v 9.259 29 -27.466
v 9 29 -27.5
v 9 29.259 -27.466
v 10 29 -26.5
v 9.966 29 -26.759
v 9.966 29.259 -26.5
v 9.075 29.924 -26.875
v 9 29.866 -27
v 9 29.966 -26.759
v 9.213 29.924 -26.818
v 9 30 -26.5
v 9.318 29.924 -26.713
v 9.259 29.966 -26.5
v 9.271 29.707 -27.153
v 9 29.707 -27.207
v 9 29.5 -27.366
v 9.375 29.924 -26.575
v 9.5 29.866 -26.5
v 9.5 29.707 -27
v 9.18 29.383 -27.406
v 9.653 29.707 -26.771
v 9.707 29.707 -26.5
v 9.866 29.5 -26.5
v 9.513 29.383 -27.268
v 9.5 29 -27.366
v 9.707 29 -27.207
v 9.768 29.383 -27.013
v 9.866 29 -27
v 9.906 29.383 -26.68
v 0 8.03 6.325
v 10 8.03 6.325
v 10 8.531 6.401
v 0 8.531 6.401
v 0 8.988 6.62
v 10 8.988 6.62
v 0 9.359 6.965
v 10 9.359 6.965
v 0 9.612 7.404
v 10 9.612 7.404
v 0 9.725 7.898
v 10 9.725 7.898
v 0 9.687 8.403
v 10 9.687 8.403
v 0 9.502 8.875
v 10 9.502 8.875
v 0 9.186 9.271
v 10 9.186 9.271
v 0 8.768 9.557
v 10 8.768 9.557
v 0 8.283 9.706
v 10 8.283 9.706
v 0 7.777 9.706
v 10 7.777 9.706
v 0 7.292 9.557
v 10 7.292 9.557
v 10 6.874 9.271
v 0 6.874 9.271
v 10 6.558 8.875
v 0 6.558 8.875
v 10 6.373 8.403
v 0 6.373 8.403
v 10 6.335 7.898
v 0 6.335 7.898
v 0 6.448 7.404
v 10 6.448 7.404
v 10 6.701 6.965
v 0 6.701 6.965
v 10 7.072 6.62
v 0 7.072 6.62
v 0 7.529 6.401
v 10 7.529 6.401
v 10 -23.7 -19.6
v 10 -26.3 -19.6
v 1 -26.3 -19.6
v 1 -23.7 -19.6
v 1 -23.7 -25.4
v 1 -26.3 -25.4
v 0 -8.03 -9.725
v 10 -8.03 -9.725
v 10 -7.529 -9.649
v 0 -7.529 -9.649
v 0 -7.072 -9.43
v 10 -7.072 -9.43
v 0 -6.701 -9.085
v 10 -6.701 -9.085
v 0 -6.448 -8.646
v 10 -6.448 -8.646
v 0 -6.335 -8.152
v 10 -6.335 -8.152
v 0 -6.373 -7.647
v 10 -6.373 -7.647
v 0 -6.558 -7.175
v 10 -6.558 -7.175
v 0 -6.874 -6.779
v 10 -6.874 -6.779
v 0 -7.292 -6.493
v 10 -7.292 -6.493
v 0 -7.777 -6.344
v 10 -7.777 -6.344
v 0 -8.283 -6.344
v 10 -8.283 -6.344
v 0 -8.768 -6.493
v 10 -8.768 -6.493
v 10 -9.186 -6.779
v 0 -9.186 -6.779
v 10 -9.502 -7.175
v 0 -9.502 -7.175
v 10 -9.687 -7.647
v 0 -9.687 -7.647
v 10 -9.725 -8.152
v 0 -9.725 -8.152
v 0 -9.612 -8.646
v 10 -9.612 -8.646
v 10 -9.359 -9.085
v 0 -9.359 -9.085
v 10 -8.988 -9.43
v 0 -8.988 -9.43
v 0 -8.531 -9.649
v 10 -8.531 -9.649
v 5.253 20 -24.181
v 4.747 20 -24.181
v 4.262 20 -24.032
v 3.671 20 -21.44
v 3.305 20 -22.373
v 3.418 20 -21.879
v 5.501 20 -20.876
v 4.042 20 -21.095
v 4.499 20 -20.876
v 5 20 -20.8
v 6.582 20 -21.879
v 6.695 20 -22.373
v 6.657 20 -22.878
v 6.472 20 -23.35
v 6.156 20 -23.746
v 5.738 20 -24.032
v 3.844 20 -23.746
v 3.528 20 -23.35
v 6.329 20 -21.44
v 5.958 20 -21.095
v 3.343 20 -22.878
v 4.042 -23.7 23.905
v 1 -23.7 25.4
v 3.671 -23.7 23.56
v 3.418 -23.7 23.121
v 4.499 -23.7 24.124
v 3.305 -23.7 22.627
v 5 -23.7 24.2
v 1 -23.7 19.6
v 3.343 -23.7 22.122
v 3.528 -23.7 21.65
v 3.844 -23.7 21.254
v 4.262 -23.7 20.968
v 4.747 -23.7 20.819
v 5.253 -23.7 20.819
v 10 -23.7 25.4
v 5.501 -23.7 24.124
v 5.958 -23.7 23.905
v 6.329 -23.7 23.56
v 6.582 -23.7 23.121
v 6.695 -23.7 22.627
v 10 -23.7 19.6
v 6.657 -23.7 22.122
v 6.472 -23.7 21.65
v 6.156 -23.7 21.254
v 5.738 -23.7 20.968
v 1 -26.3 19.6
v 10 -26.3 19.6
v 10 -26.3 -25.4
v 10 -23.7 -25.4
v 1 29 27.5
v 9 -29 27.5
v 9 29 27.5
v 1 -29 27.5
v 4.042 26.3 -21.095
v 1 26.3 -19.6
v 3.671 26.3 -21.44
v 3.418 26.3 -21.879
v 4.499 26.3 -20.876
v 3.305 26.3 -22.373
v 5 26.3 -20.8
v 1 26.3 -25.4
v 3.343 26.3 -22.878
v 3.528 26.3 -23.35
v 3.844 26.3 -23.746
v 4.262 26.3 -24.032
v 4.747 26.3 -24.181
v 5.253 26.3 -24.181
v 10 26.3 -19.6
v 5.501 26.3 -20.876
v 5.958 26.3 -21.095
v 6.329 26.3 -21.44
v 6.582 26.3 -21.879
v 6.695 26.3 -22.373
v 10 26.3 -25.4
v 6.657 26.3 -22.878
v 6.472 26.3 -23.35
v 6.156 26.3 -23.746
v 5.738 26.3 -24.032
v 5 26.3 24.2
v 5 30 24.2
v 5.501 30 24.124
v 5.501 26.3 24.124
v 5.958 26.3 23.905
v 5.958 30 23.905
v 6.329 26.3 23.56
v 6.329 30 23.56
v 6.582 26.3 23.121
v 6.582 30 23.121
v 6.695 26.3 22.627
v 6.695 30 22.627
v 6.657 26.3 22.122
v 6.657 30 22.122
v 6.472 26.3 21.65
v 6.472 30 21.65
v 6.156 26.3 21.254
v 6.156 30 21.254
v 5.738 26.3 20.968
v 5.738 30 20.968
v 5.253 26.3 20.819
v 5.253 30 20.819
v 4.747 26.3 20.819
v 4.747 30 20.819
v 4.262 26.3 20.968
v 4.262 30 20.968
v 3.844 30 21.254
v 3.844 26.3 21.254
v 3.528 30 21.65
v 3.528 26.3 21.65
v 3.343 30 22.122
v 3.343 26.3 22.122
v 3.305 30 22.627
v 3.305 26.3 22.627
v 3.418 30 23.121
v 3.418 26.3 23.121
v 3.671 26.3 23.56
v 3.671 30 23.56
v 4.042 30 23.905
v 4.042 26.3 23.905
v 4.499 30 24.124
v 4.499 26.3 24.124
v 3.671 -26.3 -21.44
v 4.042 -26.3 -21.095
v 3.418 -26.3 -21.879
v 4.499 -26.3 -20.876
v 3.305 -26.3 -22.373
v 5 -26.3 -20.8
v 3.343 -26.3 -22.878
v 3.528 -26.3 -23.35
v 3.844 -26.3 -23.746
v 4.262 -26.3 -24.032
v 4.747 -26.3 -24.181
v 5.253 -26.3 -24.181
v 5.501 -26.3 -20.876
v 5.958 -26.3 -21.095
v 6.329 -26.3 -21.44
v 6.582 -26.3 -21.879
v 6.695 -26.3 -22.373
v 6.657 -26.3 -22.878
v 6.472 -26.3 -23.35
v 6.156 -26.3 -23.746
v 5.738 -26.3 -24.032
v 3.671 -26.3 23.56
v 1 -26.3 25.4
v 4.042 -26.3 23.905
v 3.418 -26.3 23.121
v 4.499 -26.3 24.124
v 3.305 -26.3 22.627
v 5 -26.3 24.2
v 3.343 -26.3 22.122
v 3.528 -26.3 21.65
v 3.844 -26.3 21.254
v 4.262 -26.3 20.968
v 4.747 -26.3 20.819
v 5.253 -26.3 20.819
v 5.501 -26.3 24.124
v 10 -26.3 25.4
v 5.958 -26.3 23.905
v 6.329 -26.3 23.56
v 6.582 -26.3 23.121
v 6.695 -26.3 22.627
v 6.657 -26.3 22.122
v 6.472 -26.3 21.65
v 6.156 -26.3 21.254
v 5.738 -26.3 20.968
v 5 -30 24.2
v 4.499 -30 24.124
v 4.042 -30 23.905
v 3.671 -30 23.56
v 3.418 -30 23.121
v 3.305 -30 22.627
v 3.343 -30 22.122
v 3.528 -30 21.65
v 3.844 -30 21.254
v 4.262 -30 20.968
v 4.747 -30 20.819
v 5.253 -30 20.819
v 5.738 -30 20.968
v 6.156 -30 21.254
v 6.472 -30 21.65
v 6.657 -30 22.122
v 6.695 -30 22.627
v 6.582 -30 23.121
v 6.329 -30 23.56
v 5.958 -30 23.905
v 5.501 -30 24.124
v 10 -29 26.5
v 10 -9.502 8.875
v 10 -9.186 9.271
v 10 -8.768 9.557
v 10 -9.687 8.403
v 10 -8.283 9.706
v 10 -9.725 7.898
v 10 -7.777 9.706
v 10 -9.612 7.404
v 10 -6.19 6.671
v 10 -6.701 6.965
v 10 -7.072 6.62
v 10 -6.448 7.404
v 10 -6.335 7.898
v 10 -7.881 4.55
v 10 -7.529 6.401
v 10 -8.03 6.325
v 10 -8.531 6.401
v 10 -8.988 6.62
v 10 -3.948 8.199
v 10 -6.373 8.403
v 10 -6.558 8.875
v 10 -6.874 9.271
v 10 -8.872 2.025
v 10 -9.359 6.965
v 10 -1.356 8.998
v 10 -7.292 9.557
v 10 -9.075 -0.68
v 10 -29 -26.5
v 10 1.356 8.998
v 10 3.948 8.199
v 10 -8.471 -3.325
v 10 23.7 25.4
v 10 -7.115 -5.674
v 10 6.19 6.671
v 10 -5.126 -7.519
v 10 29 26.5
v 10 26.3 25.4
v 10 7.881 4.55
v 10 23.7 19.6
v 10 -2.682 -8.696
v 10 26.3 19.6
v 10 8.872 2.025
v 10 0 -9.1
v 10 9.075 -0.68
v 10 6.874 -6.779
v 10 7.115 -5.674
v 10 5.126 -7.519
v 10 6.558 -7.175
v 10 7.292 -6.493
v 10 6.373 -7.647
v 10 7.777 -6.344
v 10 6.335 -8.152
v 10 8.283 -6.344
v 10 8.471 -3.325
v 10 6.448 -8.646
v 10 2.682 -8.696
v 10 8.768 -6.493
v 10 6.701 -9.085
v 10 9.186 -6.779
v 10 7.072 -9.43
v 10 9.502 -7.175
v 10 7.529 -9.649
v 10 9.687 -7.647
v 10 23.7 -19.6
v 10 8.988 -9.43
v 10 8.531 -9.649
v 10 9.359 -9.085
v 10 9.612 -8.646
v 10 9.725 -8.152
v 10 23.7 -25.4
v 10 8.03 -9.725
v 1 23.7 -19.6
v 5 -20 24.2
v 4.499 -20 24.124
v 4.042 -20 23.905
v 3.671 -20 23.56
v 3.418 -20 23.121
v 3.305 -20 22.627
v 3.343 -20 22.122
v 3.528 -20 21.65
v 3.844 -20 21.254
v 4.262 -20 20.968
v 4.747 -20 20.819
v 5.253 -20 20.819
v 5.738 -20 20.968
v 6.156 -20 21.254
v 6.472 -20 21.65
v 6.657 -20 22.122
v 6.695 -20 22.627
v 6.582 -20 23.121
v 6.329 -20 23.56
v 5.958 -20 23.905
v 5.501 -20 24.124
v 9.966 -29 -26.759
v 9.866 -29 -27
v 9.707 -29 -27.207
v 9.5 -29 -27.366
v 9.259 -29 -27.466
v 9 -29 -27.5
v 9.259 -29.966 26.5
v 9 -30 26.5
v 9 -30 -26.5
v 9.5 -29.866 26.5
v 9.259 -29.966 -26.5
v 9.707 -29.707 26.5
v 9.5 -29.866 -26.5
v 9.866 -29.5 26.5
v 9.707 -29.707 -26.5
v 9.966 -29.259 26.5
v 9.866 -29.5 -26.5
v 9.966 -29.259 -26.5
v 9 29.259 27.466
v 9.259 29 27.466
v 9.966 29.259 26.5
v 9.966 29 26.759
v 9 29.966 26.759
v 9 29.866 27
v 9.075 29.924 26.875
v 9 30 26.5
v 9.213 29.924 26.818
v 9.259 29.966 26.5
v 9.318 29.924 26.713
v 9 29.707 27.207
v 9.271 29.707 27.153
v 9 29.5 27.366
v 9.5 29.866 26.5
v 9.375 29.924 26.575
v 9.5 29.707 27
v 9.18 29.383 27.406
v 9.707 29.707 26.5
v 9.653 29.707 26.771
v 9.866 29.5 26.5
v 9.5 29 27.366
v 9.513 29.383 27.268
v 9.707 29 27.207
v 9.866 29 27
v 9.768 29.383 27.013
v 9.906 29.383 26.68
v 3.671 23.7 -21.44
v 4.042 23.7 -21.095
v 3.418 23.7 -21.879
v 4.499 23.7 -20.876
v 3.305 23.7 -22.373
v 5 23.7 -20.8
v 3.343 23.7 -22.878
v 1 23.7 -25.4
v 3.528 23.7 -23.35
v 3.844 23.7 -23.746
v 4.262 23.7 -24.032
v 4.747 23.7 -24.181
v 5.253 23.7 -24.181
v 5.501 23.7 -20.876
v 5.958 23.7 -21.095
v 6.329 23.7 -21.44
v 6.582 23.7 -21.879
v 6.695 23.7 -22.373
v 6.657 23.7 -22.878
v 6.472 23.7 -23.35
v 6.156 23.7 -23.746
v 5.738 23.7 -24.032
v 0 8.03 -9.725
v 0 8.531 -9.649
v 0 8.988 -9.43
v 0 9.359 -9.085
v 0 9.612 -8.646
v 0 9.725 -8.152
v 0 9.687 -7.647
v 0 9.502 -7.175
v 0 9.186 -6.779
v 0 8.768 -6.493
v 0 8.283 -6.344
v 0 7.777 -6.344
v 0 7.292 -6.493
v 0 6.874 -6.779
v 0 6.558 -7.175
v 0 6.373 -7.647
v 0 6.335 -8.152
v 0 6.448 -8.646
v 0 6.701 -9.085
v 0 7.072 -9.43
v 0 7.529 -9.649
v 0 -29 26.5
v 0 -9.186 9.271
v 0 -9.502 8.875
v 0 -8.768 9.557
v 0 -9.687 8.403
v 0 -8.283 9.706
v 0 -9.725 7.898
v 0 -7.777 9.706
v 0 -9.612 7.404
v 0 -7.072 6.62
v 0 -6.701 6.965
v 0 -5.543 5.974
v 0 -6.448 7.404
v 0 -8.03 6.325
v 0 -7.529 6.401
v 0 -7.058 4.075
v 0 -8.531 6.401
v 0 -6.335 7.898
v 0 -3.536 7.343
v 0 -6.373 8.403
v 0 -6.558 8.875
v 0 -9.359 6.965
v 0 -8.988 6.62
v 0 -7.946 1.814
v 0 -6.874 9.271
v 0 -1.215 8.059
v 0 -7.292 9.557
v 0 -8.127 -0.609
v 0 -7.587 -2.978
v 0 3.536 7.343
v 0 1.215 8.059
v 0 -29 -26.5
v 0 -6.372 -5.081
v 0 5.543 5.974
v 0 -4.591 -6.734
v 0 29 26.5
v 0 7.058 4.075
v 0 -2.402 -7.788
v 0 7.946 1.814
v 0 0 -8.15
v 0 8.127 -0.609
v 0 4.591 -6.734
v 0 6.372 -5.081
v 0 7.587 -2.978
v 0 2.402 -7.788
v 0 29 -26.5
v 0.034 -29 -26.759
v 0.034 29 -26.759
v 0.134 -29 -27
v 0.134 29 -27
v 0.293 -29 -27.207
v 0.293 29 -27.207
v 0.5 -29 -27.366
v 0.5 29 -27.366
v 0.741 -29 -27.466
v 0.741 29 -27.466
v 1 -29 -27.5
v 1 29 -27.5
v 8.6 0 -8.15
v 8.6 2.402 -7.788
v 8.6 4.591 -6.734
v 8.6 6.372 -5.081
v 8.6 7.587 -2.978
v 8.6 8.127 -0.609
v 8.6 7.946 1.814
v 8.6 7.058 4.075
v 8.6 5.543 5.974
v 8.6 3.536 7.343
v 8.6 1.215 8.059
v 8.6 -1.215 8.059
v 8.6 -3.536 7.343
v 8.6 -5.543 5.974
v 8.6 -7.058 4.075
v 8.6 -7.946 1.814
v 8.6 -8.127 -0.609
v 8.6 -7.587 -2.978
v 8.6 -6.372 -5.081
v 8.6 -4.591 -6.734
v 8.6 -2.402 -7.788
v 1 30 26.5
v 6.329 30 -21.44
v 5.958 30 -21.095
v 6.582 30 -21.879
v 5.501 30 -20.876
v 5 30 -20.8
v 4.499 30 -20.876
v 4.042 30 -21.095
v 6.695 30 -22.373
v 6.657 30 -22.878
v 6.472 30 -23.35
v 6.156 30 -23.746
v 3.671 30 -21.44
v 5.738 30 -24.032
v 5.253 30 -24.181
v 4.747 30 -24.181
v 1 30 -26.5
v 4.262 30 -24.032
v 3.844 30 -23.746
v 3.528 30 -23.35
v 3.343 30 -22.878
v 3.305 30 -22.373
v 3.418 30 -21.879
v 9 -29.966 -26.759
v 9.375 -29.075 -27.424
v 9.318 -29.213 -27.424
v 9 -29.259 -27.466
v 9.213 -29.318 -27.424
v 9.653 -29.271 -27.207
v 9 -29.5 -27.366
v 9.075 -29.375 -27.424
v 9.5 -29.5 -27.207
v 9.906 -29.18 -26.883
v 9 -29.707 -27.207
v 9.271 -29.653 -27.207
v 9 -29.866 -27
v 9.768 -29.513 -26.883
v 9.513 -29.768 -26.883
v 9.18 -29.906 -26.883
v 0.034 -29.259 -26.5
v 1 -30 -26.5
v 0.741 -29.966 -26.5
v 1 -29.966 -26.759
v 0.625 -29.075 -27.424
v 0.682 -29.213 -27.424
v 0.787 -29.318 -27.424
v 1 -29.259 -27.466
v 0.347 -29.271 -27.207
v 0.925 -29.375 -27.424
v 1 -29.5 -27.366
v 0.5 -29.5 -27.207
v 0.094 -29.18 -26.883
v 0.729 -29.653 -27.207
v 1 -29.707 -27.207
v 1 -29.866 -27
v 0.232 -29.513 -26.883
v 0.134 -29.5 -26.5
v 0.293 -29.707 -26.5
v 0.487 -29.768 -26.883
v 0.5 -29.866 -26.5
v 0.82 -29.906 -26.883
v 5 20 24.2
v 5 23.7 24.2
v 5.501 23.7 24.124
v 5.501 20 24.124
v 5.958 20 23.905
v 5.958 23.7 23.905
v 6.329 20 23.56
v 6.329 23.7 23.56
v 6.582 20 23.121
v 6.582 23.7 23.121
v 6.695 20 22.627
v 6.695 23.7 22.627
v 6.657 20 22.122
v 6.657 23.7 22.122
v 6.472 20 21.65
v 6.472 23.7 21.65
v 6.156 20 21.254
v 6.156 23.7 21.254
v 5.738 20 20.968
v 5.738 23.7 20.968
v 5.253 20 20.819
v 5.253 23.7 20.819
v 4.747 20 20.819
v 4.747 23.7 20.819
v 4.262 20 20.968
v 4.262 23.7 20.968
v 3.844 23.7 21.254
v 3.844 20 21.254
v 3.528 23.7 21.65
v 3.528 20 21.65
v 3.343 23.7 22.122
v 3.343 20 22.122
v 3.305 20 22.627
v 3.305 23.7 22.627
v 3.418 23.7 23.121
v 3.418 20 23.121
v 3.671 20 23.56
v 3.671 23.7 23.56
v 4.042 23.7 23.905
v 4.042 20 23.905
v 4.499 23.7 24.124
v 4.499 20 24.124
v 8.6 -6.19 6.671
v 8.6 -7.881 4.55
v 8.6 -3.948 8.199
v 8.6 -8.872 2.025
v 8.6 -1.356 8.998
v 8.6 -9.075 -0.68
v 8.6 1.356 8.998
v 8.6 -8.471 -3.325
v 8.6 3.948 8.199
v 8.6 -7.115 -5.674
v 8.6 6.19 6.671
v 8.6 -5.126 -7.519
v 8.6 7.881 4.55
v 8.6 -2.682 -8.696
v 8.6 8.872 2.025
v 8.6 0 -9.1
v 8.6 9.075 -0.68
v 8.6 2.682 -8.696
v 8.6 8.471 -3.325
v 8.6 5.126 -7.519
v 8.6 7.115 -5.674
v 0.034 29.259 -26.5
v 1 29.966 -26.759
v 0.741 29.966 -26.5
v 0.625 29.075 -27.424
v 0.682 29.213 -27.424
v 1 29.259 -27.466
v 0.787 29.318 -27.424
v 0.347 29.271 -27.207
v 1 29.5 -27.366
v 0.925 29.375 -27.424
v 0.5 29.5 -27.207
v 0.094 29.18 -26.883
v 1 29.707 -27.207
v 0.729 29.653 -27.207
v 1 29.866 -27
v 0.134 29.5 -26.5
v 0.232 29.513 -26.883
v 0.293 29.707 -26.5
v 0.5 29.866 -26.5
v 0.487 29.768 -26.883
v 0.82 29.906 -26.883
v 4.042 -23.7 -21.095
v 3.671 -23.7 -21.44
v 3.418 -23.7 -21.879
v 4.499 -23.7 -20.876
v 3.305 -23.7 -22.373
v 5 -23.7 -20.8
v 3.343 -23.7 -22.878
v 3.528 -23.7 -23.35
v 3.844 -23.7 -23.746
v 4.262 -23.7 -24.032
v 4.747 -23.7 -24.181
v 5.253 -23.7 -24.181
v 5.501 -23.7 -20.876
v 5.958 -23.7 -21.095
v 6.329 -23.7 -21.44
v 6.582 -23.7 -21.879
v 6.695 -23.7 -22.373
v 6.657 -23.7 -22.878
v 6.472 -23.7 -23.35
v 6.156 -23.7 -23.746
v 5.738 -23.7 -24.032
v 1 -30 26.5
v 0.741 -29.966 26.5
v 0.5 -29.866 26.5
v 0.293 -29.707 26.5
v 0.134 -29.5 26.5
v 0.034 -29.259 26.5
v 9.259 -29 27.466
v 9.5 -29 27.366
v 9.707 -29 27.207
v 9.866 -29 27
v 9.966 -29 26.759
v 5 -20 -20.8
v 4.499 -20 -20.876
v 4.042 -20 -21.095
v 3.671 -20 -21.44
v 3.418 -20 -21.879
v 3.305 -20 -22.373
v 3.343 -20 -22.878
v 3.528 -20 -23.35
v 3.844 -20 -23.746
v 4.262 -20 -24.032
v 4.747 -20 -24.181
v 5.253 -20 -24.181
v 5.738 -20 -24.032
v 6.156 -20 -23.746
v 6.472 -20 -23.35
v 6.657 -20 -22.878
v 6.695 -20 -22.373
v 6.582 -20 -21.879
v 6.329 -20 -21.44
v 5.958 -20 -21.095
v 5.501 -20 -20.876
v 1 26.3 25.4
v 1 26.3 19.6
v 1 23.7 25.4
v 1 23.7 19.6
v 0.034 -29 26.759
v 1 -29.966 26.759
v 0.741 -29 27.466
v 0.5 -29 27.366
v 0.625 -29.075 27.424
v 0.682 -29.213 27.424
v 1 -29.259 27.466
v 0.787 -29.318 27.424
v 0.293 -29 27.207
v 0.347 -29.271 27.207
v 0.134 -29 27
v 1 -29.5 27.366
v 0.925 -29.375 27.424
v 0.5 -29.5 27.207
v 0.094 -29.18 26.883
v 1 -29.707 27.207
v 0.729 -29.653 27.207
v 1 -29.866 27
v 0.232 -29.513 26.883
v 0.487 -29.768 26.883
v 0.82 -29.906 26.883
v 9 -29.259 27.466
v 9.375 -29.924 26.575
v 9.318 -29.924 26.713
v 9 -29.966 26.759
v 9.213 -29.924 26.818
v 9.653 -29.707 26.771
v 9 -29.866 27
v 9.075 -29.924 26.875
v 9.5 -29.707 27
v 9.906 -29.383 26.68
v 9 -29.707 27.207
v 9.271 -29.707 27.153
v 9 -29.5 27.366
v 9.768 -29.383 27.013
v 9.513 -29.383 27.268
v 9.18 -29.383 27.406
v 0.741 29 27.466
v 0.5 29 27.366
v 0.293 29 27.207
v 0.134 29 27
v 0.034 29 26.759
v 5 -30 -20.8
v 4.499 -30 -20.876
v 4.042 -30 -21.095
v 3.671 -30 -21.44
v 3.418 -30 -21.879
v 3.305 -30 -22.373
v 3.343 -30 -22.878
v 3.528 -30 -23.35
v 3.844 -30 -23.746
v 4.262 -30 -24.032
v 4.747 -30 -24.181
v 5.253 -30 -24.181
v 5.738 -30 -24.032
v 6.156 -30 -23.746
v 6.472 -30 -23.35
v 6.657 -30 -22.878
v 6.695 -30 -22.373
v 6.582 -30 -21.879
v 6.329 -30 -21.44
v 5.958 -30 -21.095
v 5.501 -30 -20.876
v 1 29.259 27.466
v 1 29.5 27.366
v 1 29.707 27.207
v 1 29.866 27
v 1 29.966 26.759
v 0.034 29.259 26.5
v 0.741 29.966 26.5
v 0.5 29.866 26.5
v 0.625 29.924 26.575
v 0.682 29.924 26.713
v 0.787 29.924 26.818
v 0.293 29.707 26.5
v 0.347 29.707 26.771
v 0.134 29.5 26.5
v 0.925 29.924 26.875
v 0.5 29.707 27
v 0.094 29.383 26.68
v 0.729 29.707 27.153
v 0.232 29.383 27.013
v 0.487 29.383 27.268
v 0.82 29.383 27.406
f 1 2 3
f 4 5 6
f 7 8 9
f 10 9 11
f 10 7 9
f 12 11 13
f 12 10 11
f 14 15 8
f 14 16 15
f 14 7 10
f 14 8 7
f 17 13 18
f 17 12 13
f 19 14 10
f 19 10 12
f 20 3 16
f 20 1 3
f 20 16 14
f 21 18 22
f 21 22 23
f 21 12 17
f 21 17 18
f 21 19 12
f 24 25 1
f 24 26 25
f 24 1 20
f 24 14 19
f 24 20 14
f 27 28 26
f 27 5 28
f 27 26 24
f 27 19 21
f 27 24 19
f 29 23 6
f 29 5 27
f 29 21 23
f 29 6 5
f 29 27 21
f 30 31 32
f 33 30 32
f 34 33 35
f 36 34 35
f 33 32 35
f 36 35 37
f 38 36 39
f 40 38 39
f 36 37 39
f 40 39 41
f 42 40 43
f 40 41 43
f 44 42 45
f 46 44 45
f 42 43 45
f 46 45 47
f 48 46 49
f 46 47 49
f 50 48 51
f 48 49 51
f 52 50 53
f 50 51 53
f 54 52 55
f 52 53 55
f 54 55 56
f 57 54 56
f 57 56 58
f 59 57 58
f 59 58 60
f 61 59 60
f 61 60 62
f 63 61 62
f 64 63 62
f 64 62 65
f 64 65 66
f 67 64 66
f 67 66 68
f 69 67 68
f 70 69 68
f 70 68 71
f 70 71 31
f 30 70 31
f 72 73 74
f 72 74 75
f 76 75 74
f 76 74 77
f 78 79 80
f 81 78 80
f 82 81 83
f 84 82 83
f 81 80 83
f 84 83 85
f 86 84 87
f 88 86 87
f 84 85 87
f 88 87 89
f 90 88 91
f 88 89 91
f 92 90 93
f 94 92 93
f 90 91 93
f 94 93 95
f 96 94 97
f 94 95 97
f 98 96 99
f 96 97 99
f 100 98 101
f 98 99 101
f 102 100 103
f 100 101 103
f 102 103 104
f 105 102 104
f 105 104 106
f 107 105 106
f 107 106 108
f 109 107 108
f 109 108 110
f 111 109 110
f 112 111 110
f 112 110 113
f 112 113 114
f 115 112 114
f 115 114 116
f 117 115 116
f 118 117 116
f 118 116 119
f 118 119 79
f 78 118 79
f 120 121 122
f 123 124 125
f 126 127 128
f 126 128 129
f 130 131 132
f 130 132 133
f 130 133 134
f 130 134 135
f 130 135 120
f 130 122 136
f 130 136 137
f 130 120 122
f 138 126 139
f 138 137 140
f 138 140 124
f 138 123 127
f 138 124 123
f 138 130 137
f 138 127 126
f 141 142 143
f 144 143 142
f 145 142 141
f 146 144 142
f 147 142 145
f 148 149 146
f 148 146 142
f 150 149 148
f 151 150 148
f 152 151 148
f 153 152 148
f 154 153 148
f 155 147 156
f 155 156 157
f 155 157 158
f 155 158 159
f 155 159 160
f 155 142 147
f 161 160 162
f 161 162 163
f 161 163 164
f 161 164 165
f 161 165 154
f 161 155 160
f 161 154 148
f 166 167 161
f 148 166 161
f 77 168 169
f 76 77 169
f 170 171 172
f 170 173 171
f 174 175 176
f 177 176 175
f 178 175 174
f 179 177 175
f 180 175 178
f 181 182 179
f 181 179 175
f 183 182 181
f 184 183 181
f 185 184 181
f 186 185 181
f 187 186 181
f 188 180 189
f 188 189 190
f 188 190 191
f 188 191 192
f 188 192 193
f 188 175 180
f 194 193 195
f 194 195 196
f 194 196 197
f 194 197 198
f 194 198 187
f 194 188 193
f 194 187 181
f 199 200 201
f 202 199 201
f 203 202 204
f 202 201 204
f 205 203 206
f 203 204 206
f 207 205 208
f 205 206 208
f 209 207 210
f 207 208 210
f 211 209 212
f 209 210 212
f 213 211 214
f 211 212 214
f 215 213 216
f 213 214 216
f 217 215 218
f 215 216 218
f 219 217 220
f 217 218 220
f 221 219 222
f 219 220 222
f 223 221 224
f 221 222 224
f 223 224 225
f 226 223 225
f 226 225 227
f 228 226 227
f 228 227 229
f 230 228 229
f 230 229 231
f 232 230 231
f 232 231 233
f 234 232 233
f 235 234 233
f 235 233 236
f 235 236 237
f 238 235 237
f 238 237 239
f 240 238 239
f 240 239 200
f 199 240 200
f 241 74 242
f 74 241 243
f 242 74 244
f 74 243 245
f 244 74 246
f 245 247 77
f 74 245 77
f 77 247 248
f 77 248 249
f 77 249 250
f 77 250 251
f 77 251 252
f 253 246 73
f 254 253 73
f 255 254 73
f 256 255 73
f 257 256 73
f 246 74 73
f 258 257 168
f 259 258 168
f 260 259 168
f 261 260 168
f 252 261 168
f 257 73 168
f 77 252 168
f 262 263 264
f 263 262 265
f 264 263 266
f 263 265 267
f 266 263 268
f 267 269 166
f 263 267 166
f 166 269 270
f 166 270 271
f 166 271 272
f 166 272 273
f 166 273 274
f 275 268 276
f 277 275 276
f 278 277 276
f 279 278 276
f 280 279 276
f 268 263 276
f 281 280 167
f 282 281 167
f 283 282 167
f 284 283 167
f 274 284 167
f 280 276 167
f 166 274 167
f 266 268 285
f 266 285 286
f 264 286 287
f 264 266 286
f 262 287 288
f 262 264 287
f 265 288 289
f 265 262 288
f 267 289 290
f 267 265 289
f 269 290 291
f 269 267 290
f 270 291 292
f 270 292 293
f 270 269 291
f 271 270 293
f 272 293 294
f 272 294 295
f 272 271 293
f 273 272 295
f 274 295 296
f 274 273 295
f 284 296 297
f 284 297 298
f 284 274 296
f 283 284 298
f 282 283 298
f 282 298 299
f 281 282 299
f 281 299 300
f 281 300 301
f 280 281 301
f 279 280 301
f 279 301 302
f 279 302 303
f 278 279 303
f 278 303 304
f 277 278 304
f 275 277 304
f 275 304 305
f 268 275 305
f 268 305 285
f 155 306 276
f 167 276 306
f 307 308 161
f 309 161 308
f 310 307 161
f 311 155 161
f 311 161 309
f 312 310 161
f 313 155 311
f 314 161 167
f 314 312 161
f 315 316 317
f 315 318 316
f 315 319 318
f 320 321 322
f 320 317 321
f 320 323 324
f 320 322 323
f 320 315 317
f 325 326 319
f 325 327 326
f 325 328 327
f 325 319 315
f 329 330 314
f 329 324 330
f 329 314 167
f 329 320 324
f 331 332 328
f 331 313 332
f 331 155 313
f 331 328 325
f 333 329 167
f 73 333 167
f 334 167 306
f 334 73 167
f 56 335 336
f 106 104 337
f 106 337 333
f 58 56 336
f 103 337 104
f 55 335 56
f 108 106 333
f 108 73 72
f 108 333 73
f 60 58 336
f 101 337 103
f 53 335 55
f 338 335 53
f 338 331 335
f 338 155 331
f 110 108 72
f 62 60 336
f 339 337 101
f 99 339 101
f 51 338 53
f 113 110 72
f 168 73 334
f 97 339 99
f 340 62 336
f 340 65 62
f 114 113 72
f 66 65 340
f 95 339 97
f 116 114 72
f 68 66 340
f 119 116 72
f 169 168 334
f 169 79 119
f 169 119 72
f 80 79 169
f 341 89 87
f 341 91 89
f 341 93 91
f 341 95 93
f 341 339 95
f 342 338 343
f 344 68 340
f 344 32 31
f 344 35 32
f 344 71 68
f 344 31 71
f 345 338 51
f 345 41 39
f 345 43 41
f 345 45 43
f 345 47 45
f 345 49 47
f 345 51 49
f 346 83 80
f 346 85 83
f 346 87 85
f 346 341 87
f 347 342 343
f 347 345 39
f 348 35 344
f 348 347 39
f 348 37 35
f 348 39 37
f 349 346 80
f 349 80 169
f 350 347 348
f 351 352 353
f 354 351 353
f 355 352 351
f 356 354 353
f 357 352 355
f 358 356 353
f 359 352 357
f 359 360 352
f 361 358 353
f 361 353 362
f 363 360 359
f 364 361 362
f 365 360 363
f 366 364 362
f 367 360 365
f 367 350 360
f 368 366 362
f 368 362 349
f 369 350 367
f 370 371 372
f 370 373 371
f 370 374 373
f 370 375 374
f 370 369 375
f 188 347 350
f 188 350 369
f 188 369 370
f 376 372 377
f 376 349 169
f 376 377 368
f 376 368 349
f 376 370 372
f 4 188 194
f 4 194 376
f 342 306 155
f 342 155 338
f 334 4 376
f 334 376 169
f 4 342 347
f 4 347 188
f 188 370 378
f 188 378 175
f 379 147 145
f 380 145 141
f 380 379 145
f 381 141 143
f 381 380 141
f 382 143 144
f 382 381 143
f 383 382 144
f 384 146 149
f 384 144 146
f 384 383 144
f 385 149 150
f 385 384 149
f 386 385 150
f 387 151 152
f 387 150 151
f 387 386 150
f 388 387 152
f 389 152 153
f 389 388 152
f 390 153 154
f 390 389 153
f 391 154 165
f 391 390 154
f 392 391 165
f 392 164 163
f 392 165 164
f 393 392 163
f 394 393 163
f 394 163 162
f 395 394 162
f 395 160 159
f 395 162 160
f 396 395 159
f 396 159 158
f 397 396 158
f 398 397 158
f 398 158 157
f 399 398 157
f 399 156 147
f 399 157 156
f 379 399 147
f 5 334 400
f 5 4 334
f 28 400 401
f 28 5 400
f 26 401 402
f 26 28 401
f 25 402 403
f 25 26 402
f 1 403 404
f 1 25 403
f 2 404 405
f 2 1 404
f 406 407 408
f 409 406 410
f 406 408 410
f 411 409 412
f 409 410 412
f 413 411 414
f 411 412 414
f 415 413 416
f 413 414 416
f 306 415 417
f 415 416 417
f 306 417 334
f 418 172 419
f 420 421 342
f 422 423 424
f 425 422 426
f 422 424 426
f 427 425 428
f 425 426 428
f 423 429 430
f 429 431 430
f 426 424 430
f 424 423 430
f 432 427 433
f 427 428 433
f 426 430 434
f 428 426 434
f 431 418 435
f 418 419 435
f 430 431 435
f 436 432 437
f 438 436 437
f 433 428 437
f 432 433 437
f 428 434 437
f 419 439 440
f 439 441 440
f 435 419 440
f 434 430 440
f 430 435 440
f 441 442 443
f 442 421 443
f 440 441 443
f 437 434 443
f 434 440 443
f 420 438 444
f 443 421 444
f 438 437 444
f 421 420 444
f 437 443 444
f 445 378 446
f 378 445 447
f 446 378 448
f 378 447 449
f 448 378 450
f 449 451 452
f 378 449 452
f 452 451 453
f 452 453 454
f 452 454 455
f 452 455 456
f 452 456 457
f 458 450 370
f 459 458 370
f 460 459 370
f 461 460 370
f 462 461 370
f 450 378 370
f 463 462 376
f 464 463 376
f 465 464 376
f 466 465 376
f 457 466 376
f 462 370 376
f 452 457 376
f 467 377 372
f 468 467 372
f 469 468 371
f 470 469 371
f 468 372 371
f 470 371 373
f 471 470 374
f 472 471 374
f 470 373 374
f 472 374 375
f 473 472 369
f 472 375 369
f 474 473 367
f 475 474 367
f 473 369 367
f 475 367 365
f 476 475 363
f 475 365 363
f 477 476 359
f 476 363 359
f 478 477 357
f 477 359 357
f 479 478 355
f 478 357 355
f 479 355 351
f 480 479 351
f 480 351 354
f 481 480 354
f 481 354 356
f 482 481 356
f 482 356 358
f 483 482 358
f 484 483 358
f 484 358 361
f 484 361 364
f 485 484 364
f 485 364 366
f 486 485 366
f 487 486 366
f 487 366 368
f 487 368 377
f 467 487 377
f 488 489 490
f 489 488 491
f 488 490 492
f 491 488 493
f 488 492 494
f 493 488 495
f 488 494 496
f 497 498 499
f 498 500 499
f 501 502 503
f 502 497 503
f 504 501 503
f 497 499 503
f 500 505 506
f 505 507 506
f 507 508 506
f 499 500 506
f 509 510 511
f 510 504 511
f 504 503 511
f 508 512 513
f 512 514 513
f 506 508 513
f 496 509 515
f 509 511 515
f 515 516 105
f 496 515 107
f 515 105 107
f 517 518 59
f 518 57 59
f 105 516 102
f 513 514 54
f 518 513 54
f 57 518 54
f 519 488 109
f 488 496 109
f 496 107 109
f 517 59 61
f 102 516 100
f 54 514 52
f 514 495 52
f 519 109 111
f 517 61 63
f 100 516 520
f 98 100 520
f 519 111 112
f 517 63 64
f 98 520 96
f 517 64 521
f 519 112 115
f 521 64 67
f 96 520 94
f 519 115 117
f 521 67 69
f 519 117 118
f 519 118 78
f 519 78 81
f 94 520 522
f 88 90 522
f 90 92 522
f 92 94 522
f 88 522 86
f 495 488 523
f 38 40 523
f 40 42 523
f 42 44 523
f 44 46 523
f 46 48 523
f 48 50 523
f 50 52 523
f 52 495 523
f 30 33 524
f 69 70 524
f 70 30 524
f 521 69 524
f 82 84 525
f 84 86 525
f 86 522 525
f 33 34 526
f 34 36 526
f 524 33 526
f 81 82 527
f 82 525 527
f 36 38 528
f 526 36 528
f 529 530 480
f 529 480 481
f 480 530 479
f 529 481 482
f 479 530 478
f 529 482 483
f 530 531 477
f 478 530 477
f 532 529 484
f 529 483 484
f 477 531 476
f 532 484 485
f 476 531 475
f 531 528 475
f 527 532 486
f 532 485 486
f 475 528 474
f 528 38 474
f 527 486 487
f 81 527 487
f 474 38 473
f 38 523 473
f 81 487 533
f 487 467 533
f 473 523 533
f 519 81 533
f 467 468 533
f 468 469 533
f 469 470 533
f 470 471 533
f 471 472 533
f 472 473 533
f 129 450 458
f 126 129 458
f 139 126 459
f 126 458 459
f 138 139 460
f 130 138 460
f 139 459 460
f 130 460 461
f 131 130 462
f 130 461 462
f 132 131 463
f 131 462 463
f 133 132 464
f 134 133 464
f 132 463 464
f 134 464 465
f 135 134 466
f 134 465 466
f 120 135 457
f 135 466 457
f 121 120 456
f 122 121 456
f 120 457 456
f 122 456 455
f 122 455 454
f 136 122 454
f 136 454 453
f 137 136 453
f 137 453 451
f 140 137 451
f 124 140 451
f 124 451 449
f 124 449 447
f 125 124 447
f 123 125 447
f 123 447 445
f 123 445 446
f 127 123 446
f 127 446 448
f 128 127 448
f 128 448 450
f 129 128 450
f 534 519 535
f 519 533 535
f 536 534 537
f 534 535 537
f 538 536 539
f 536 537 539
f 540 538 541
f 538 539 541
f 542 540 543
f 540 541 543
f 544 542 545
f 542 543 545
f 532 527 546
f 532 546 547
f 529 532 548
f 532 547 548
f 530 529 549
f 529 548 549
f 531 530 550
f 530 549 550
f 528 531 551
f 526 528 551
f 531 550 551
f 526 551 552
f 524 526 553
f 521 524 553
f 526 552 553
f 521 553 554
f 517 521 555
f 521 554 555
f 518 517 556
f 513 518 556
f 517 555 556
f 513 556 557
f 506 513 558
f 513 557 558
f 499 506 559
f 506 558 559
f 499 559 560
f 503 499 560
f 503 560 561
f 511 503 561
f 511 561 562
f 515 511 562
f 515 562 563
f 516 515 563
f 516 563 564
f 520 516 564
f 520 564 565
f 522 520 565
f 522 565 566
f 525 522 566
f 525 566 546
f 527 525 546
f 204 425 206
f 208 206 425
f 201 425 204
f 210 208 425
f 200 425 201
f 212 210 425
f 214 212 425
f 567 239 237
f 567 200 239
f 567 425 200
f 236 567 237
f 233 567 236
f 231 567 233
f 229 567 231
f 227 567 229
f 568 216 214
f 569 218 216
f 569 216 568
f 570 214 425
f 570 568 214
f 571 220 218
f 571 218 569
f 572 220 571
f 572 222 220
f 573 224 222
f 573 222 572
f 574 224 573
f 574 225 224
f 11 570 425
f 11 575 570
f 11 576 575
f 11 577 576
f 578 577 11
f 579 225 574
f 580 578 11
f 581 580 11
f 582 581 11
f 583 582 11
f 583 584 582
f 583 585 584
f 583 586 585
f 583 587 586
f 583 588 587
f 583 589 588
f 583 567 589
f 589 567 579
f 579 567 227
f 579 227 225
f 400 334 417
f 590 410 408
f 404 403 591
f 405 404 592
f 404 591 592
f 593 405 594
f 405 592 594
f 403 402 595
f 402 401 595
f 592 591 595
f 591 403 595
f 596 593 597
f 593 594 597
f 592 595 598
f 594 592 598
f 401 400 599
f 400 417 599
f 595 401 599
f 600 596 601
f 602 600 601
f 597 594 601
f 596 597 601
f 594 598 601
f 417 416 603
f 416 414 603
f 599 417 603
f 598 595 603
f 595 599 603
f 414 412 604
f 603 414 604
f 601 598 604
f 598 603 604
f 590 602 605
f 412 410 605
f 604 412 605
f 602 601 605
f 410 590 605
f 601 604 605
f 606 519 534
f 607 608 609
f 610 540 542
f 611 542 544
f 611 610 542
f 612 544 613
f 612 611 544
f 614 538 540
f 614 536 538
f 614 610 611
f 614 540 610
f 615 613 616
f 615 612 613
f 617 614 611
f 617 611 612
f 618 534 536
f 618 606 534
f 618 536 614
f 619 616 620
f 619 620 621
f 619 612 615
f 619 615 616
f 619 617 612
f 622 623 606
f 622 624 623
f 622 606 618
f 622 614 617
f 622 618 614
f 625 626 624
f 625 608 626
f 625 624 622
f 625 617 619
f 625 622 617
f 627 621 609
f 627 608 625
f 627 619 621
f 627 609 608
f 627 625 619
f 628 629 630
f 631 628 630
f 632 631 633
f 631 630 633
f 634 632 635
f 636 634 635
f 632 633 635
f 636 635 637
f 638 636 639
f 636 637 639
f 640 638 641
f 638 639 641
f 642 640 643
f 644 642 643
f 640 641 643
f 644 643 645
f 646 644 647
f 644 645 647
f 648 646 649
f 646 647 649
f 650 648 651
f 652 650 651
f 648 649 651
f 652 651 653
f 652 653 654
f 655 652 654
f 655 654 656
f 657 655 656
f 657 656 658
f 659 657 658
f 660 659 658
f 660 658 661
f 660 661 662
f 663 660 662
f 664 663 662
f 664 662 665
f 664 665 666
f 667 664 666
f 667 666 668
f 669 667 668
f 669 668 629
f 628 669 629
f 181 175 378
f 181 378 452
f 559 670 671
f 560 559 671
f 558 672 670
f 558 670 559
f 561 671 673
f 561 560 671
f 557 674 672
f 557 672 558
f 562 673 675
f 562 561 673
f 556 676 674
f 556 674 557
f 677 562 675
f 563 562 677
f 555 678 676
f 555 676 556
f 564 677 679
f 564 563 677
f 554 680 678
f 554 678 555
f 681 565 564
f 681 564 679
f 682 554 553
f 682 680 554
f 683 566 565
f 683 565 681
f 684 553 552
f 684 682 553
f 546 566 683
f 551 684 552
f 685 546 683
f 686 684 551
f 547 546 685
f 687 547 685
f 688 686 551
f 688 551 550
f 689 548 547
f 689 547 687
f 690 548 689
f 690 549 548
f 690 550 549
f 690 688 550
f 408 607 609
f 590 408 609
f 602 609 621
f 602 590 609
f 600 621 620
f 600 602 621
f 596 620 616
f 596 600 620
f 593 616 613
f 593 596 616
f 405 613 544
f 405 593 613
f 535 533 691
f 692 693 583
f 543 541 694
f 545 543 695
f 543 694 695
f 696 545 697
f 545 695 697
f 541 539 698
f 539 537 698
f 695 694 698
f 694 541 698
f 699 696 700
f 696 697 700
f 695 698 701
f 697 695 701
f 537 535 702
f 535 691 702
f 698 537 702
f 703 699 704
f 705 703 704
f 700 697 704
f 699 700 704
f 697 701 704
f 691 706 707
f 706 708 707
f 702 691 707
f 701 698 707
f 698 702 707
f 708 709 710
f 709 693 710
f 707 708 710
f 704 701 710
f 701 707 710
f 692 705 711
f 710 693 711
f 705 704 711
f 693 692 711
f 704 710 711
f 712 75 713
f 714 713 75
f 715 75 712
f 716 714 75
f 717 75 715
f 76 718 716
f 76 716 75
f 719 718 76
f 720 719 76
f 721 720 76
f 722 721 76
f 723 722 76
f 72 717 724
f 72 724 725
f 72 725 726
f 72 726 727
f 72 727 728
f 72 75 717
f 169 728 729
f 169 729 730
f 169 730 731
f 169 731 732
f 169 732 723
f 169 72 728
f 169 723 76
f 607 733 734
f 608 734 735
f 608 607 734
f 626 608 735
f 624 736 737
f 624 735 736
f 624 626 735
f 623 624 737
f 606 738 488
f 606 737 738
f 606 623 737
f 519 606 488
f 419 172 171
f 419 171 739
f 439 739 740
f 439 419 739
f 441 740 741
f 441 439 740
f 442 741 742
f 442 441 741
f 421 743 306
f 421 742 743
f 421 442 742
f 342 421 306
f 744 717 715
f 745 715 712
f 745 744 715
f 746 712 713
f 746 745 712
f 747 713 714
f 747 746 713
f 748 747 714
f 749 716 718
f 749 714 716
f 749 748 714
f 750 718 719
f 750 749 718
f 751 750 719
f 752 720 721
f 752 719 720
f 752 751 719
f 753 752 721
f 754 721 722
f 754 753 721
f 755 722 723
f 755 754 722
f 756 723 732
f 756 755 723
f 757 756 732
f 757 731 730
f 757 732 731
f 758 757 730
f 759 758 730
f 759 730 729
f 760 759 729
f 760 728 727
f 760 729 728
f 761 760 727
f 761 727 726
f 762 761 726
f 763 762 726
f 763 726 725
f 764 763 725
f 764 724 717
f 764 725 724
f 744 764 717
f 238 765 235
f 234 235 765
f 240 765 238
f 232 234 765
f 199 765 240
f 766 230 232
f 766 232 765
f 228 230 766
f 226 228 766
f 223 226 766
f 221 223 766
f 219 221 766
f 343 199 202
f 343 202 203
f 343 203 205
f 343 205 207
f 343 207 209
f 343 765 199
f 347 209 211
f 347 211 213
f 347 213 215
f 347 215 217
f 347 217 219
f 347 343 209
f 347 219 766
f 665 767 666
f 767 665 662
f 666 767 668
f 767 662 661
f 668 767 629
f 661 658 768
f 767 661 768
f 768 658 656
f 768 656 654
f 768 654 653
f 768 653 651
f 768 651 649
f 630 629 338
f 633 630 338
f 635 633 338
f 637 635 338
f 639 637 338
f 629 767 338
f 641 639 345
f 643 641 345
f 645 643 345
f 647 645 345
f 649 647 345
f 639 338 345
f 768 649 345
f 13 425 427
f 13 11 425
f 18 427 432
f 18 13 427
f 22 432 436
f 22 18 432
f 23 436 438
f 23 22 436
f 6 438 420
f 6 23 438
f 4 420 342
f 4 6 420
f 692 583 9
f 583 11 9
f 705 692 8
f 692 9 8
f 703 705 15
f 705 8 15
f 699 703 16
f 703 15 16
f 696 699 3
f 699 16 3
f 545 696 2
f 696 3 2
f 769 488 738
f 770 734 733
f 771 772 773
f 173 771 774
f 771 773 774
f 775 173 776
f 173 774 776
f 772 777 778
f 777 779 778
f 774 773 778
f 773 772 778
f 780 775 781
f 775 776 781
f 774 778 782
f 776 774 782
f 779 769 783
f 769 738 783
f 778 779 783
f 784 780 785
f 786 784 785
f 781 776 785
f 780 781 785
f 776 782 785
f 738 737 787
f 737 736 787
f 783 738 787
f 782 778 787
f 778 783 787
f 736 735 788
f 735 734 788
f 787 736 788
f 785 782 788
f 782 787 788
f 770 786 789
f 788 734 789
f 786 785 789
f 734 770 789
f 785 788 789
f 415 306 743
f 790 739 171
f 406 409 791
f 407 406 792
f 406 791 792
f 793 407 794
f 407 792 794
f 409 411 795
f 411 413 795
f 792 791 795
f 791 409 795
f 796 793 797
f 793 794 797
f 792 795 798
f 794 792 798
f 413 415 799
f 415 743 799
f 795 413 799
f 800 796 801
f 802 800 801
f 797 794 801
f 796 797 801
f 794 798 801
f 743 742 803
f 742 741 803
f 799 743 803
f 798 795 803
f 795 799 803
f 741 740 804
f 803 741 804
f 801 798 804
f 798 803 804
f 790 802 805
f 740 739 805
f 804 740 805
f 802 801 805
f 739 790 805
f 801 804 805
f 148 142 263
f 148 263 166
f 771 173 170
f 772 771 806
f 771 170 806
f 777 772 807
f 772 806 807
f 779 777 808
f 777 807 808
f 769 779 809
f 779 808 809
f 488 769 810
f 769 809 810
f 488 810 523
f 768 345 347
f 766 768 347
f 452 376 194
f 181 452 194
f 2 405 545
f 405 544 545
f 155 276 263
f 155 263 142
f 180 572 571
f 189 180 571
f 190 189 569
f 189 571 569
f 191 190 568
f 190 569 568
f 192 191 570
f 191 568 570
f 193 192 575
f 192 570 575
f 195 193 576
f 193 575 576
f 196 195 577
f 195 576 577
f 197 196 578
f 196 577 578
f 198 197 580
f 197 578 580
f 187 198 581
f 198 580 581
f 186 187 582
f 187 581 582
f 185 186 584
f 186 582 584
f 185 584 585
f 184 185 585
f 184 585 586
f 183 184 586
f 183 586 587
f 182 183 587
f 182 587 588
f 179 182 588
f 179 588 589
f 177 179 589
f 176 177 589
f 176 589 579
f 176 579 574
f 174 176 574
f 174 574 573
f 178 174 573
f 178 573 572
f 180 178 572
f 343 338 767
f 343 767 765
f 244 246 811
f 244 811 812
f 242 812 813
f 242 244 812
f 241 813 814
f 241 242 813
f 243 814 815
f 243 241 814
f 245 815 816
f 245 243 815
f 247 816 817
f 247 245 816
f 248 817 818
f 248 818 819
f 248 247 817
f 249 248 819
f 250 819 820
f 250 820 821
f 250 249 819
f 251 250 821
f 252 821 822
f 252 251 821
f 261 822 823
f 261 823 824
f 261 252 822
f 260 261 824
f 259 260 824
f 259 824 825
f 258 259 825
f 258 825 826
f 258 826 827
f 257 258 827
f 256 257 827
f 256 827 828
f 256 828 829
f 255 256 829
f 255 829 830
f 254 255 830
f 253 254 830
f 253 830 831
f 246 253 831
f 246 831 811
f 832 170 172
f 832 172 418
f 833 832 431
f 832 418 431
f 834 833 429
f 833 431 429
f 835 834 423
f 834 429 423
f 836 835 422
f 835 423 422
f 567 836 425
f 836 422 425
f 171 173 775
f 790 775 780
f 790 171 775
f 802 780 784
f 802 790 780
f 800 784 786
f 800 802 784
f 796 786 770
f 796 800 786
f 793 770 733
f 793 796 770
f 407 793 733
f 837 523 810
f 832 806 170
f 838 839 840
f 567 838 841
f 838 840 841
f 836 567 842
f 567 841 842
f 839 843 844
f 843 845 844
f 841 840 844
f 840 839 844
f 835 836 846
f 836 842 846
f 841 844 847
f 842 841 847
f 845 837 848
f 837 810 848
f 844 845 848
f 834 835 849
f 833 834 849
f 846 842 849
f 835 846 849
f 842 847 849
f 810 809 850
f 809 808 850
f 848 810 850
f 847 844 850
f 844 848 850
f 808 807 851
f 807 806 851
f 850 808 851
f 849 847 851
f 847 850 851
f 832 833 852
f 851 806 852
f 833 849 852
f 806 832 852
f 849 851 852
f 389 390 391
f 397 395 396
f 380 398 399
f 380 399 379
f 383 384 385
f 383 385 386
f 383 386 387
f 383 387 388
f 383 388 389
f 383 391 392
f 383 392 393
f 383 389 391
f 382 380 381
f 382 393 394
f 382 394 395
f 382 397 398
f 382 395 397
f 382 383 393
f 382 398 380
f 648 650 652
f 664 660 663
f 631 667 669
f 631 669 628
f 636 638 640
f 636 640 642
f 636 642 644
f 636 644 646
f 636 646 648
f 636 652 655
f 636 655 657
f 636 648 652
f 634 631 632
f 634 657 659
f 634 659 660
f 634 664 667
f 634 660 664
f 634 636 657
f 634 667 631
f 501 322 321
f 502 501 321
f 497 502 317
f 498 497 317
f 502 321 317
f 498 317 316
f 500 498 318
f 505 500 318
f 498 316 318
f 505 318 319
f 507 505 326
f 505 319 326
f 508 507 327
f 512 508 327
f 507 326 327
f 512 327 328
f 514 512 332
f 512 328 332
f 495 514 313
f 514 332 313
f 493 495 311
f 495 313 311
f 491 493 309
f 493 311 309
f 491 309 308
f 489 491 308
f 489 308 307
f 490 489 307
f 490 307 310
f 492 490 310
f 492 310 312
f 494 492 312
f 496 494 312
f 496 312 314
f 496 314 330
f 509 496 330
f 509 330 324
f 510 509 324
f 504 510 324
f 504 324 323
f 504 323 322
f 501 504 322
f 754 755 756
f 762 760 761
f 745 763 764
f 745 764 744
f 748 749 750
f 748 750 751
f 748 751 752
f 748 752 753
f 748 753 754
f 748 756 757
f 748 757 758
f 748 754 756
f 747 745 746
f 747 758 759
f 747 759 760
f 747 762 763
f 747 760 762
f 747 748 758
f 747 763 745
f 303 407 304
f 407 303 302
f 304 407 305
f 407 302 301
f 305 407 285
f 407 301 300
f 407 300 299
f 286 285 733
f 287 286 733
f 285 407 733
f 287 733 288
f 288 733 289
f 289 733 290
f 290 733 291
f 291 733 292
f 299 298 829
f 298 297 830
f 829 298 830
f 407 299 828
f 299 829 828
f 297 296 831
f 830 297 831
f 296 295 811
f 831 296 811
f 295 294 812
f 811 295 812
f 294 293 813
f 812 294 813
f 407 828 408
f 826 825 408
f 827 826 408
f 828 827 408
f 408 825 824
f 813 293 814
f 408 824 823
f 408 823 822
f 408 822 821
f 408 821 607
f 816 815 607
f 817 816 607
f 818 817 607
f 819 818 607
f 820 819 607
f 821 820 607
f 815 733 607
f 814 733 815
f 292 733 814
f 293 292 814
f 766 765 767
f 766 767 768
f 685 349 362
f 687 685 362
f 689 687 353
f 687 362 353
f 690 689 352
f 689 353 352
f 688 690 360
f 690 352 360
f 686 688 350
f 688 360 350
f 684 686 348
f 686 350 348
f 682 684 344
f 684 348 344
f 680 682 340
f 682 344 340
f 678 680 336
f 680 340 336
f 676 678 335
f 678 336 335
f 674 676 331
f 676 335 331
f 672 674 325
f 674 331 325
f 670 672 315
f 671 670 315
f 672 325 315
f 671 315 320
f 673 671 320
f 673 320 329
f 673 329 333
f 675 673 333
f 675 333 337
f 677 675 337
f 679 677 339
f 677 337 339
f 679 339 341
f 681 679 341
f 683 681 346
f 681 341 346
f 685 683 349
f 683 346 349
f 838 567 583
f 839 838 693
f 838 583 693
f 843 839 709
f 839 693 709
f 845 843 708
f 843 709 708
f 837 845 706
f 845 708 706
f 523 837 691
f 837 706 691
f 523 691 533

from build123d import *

# Parameters (mm, degrees)
SKETCH1_W           = 55
SKETCH1_H           = 60
BOSS_EXTRUDE1_DEPTH = 10
SKETCH2_R           = 1.7
CUT_EXTRUDE1_DEPTH  = 10
CUT_EXTRUDE2_START  = -10
SKETCH3_R           = 1.7
CUT_EXTRUDE2_DEPTH  = 10
SKETCH4_W           = 5.8
SKETCH4_H           = 2.6
CUT_EXTRUDE3_DEPTH  = 9
SKETCH5_R           = 8.15
CUT_EXTRUDE4_DEPTH  = 24
SKETCH6_R           = 9.1
CUT_EXTRUDE5_DEPTH  = 1.4
FILLET1_R           = 1
SKETCH7_R           = 1.7
CUT_EXTRUDE6_DEPTH  = 27


with BuildPart() as part:
    # Sketch1 → Boss-Extrude1 (new body)
    with BuildSketch(Plane(origin=(0, 0, 0), x_dir=(0, 0, -1), z_dir=(1, 0, 0))):
        Rectangle(SKETCH1_W, SKETCH1_H)
    extrude(amount=BOSS_EXTRUDE1_DEPTH)

    # Sketch2 → Cut-Extrude1 (cut)
    with BuildSketch(Plane(origin=(0, 30, 0), x_dir=(1, 0, 0), z_dir=(0, 1, 0))):
        with Locations(Location((5, 22.5, 0), (0, 0, 270))):
            Circle(SKETCH2_R)
        with Locations(Location((5, -22.5, 0), (0, 0, 270))):
            Circle(SKETCH2_R)
    extrude(amount=-CUT_EXTRUDE1_DEPTH, mode=Mode.SUBTRACT)

    # Sketch3 → Cut-Extrude2 (cut)
    with BuildSketch(Plane.XZ.offset(30).offset(CUT_EXTRUDE2_START)):
        with Locations(Location((5, 22.5, 0), (0, 0, 90))):
            Circle(SKETCH3_R)
        with Locations(Location((5, -22.5, 0), (0, 0, 90))):
            Circle(SKETCH3_R)
    extrude(amount=CUT_EXTRUDE2_DEPTH, mode=Mode.SUBTRACT)

    # Sketch4 → Cut-Extrude3 (cut)
    with BuildSketch(Plane(origin=(10, 0, 0), x_dir=(0, 0, -1), z_dir=(1, 0, 0))):
        with Locations((-22.5, 25)):
            Rectangle(SKETCH4_W, SKETCH4_H)
        with Locations((22.5, 25)):
            Rectangle(SKETCH4_W, SKETCH4_H)
        with Locations((-22.5, -25)):
            Rectangle(SKETCH4_W, SKETCH4_H)
        with Locations((22.5, -25)):
            Rectangle(SKETCH4_W, SKETCH4_H)
    extrude(amount=-CUT_EXTRUDE3_DEPTH, mode=Mode.SUBTRACT)

    # Sketch5 → Cut-Extrude4 (cut)
    with BuildSketch(Plane(origin=(10, 0, 0), x_dir=(0, 0, -1), z_dir=(1, 0, 0))):
        Circle(SKETCH5_R)
    extrude(amount=-CUT_EXTRUDE4_DEPTH, mode=Mode.SUBTRACT)

    # Sketch6 → Cut-Extrude5 (cut)
    with BuildSketch(Plane(origin=(10, 0, 0), x_dir=(0, 0, -1), z_dir=(1, 0, 0))):
        Circle(SKETCH6_R)
    extrude(amount=-CUT_EXTRUDE5_DEPTH, mode=Mode.SUBTRACT)

    # Fillet1
    fillet1_edges = [part.edges().sort_by_distance(p)[0] for p in [
        (10, 0, 27.5),
        (10, -30, 0),
        (10, 0, -27.5),
        (0, -30, 0),
        (0, 0, 27.5),
        (0, 30, 0),
        (0, 0, -27.5),
        (5, -30, -27.5),
        (5, -30, 27.5),
        (5, 30, 27.5),
        (5, 30, -27.5),
        (10, 30, 0),
    ]]
    fillet(fillet1_edges, radius=FILLET1_R)

    # Sketch7 → Cut-Extrude6 (cut)
    with BuildSketch(Plane(origin=(10, 0, 0), x_dir=(0, 0, -1), z_dir=(1, 0, 0))):
        with Locations((-8.025, 8.03)):
            Circle(SKETCH7_R)
        with Locations((8.025, 8.03)):
            Circle(SKETCH7_R)
        with Locations((8.025, -8.03)):
            Circle(SKETCH7_R)
        with Locations((-8.025, -8.03)):
            Circle(SKETCH7_R)
    extrude(amount=-CUT_EXTRUDE6_DEPTH, mode=Mode.SUBTRACT)


solid = part.part
